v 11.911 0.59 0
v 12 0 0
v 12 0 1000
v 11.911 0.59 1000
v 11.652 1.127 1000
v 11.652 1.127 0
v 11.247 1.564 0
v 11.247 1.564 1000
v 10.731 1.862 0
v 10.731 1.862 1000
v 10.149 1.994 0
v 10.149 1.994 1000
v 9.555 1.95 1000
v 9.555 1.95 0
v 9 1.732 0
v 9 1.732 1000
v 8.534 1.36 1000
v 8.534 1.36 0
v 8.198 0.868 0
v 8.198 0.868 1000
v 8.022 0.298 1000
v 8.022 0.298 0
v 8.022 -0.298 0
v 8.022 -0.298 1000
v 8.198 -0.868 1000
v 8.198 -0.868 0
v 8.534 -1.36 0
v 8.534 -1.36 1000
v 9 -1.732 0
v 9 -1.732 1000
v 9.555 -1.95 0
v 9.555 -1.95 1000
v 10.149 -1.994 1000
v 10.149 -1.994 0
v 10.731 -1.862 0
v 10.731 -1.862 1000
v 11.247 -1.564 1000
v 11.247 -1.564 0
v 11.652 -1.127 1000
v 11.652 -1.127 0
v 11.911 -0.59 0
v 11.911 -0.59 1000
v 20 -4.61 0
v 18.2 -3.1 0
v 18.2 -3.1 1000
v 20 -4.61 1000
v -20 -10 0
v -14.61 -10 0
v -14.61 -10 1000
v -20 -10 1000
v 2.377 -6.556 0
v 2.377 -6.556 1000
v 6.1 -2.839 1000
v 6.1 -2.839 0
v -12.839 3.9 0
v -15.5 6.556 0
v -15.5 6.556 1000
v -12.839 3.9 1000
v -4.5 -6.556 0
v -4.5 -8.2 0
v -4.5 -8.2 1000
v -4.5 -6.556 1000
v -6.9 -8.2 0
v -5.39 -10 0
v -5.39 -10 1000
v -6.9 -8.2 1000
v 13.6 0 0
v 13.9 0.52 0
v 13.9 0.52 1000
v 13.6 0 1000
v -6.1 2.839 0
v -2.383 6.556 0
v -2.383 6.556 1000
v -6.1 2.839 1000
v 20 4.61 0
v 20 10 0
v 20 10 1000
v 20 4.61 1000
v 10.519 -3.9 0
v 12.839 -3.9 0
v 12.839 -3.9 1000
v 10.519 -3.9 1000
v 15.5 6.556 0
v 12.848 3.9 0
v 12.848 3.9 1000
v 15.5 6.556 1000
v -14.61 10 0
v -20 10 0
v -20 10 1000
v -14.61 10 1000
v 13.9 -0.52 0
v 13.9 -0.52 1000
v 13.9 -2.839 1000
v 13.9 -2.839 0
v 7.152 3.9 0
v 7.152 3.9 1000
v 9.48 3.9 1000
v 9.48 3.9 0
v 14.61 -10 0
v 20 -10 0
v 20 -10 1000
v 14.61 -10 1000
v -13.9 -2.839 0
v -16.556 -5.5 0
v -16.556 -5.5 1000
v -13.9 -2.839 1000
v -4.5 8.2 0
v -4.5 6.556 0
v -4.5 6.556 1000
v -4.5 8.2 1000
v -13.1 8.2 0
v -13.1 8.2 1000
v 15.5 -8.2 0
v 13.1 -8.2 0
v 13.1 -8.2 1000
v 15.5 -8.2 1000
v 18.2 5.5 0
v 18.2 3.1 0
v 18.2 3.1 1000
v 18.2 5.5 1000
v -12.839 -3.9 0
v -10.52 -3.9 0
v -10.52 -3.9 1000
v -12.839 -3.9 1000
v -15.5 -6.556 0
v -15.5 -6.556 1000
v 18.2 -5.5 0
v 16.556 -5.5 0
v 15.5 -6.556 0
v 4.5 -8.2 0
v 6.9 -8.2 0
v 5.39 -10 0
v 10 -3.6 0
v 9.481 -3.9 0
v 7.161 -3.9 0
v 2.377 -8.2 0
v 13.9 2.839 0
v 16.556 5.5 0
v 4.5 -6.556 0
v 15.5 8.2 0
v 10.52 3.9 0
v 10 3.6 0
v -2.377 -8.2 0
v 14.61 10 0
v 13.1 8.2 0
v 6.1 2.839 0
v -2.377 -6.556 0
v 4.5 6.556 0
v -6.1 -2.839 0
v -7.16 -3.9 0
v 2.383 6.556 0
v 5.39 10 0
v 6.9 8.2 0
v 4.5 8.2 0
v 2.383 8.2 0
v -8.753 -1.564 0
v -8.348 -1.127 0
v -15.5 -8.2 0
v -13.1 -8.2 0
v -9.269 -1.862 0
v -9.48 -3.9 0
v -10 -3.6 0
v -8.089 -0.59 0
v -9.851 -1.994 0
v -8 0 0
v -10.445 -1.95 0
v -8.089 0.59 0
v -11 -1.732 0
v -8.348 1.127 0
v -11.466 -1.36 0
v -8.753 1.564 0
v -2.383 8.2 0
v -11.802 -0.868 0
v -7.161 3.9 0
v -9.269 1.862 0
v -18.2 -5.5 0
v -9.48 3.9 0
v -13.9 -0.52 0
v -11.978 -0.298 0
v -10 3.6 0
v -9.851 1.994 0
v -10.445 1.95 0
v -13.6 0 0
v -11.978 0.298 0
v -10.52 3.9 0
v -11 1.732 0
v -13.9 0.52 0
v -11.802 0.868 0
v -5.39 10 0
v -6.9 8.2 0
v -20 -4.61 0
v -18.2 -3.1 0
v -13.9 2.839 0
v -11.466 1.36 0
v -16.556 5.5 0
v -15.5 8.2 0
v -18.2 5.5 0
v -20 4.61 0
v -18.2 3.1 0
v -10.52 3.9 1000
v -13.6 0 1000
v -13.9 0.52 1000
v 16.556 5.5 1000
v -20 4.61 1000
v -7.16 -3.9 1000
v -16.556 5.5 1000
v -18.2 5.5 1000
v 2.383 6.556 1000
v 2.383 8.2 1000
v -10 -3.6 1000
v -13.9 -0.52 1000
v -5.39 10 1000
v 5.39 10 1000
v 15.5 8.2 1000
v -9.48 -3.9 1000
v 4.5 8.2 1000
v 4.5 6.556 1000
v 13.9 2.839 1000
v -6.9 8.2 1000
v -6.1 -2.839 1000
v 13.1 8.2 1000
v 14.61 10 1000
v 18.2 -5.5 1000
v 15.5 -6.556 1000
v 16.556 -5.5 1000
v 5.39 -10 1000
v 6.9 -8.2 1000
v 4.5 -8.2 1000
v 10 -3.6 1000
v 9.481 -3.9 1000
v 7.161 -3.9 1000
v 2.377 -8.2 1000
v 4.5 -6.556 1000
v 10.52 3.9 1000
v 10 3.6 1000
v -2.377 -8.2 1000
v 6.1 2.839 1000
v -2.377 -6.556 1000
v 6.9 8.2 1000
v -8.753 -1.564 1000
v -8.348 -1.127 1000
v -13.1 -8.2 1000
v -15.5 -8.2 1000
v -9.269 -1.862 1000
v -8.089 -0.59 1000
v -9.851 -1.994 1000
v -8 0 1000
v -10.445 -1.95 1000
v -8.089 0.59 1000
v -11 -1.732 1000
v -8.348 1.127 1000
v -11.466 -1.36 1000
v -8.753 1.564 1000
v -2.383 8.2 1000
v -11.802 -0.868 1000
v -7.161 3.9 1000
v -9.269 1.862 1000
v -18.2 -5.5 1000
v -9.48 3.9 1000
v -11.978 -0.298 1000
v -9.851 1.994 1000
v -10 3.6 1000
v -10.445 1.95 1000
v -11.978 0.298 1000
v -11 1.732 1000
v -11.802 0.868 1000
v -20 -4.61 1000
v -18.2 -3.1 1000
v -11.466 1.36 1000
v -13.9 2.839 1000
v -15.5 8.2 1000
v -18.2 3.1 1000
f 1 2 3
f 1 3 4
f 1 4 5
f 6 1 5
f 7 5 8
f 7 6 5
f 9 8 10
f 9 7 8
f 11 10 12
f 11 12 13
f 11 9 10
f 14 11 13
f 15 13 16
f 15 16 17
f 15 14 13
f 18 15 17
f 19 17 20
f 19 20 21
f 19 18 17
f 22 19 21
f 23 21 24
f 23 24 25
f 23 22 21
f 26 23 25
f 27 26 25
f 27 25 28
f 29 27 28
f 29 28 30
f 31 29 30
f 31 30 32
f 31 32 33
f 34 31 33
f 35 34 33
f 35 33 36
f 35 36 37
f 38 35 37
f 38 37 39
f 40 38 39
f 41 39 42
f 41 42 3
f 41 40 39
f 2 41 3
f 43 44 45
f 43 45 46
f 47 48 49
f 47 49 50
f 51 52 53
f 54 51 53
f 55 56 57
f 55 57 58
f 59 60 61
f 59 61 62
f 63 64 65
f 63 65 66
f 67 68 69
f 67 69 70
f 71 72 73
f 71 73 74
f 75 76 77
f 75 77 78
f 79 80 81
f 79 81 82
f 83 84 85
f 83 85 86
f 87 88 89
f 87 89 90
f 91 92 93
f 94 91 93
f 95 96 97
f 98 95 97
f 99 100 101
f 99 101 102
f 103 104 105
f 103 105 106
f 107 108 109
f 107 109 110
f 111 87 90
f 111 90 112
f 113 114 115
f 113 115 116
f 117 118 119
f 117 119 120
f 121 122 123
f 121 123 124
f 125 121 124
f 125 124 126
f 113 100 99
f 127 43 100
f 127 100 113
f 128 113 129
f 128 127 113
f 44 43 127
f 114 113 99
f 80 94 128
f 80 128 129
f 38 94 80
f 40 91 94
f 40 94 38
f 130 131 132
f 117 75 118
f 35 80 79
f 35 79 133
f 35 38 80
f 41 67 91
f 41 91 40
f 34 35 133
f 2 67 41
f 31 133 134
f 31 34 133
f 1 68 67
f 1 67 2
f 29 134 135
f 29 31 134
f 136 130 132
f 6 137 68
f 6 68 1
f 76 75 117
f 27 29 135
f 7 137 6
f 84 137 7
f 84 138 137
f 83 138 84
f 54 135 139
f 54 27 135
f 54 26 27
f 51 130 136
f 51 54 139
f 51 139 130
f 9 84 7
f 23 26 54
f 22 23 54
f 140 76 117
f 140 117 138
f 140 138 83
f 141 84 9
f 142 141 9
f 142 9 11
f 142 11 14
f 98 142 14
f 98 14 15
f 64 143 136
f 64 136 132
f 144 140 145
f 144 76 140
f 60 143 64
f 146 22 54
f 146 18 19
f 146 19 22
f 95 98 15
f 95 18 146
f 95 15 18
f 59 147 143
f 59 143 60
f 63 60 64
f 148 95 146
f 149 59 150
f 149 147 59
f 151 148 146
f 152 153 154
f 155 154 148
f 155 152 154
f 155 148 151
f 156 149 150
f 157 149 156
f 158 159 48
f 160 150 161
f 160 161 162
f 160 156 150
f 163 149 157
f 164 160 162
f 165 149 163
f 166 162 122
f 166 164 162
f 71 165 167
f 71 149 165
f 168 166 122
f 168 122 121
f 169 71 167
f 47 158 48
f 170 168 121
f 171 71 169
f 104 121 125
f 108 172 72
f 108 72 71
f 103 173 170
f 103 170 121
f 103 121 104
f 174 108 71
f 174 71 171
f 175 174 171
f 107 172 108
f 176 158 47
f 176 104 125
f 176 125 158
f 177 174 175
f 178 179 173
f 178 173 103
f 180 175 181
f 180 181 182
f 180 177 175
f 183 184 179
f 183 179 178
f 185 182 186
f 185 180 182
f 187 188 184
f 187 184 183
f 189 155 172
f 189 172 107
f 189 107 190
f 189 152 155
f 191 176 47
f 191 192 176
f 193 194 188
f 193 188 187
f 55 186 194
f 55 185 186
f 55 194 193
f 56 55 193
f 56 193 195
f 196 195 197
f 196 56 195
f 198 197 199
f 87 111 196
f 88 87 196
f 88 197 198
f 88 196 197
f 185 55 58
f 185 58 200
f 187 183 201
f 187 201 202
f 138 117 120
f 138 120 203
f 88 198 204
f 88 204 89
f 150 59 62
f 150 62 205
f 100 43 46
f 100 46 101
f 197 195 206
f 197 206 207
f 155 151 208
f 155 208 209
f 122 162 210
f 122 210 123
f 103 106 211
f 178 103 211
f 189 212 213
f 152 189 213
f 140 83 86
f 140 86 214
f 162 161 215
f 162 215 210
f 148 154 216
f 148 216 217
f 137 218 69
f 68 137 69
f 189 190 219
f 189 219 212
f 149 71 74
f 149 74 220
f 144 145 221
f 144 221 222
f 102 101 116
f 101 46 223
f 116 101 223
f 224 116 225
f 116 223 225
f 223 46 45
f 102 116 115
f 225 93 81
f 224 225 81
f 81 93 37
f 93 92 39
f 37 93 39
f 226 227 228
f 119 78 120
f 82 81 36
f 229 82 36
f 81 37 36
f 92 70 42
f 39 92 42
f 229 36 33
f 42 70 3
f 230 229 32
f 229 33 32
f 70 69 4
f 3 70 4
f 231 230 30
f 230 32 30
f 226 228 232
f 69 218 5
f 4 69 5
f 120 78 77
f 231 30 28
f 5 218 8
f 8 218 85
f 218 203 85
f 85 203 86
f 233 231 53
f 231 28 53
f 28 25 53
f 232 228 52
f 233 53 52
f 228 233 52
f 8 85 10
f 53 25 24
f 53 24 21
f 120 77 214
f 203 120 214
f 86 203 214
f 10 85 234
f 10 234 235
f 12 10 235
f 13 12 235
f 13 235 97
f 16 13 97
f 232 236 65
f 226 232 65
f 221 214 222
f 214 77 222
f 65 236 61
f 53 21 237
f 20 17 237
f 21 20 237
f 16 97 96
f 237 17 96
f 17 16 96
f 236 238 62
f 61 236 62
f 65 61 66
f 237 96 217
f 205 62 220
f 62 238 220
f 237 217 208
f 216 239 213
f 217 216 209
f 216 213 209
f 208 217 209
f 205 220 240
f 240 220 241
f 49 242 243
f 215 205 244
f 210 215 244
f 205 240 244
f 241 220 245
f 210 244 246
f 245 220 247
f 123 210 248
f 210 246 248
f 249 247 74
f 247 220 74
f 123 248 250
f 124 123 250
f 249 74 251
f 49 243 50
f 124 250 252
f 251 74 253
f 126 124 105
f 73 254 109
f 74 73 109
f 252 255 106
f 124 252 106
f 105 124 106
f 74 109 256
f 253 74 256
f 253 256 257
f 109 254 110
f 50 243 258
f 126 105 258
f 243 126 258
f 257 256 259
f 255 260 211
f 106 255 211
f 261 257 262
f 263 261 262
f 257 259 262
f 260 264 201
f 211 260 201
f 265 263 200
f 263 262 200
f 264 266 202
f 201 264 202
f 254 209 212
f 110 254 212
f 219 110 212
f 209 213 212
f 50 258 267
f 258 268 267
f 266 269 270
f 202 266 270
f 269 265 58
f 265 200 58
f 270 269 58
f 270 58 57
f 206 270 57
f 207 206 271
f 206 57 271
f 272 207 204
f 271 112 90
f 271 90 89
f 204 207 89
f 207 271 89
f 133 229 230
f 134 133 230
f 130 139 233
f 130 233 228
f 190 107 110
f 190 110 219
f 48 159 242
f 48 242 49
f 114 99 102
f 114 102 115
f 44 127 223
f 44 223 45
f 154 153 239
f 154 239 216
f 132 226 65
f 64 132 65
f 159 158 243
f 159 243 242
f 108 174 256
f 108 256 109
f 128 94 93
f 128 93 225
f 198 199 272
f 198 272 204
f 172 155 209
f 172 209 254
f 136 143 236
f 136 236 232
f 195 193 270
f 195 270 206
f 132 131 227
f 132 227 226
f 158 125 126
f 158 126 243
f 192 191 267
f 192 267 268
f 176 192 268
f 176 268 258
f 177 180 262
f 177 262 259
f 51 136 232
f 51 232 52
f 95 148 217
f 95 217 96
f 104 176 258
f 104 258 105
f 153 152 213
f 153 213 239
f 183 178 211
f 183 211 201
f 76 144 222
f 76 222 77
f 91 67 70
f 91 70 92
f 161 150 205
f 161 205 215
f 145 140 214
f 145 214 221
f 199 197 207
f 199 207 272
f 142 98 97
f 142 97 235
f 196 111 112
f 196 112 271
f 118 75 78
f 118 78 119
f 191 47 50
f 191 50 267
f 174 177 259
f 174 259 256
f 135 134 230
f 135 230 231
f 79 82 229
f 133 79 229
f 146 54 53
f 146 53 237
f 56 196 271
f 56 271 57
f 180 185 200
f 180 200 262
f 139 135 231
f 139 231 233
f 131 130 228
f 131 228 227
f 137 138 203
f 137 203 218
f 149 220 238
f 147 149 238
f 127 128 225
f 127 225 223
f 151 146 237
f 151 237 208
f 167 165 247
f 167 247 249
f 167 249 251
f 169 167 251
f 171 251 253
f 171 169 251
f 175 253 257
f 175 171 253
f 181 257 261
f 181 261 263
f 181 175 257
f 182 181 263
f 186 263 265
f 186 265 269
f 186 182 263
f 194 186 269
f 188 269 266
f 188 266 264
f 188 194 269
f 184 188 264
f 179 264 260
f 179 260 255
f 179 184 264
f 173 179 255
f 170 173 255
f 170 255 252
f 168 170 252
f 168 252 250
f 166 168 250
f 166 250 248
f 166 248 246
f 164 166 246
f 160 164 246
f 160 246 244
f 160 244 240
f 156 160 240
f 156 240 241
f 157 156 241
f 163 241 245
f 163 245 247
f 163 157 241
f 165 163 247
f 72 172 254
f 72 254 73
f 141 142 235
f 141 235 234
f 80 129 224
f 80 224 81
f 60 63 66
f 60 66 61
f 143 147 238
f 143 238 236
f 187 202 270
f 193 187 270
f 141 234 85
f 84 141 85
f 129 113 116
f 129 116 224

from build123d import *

# Parameters (mm, degrees)
SKETCH1_R           = 2
BOSS_EXTRUDE1_DEPTH = 1000


with BuildPart() as part:
    # Sketch1 → Boss-Extrude1 (new body)
    with BuildSketch(Plane.XY):
        Polygon((-5.389620664, 10), (5.389620664, 10), (6.9, 8.2), (4.5, 8.2), (4.5, 6.556171609), (7.151917065, 3.899773171), (9.480384758, 3.899773171), (10, 3.599773171), (10.519615242, 3.899773171), (12.848082935, 3.899773171), (15.5, 6.556171609), (15.5, 8.2), (13.1, 8.2), (14.610379336, 10), (20, 10), (20, 4.610379336), (18.2, 3.1), (18.2, 5.5), (16.556171609, 5.5), (13.9, 2.839339828), (13.9, 0.519615231), (13.599999981, 0), (13.9, -0.519615231), (13.9, -2.839339828), (16.556171609, -5.5), (18.2, -5.5), (18.2, -3.1), (20, -4.610379336), (20, -10), (14.610379336, -10), (13.1, -8.2), (15.5, -8.2), (15.5, -6.556171609), (12.839339828, -3.9), (10.519222362, -3.9), (10, -3.600226829), (9.480777638, -3.9), (7.160660172, -3.9), (4.5, -6.556171609), (4.5, -8.2), (6.9, -8.2), (5.389620664, -10), (-5.389620664, -10), (-6.9, -8.2), (-4.5, -8.2), (-4.5, -6.556171609), (-7.160432959, -3.900226829), (-9.480384758, -3.900226829), (-10, -3.600226829), (-10.519615242, -3.900226829), (-12.839339828, -3.9), (-15.5, -6.556171609), (-15.5, -8.2), (-13.1, -8.2), (-14.610379336, -10), (-20, -10), (-20, -4.610379336), (-18.2, -3.1), (-18.2, -5.5), (-16.556171609, -5.5), (-13.9, -2.839339828), (-13.9, -0.519615231), (-13.599999981, 0), (-13.9, 0.519615231), (-13.9, 2.839339828), (-16.556171609, 5.5), (-18.2, 5.5), (-18.2, 3.1), (-20, 4.610379336), (-20, 10), (-14.610379336, 10), (-13.1, 8.2), (-15.5, 8.2), (-15.5, 6.556171609), (-12.839339828, 3.9), (-10.519615242, 3.899773171), (-10, 3.599773171), (-9.480384758, 3.899773171), (-7.160660172, 3.9), (-4.5, 6.556171609), (-4.5, 8.2), (-6.9, 8.2), align=None)
        with Locations((-10, 0)):
            Circle(SKETCH1_R, mode=Mode.SUBTRACT)
        with Locations((10, 0)):
            Circle(SKETCH1_R, mode=Mode.SUBTRACT)
        Polygon((-6.1, -2.839339828), (-2.376887287, -6.556171609), (-2.376887287, -8.2), (2.376887287, -8.2), (2.376887287, -6.556171609), (6.1, -2.839339828), (6.1, 2.839339828), (2.383168219, 6.556171609), (2.383168219, 8.2), (-2.383168219, 8.2), (-2.383168219, 6.556171609), (-6.1, 2.839339828), align=None, mode=Mode.SUBTRACT)
    extrude(amount=BOSS_EXTRUDE1_DEPTH)


solid = part.part
